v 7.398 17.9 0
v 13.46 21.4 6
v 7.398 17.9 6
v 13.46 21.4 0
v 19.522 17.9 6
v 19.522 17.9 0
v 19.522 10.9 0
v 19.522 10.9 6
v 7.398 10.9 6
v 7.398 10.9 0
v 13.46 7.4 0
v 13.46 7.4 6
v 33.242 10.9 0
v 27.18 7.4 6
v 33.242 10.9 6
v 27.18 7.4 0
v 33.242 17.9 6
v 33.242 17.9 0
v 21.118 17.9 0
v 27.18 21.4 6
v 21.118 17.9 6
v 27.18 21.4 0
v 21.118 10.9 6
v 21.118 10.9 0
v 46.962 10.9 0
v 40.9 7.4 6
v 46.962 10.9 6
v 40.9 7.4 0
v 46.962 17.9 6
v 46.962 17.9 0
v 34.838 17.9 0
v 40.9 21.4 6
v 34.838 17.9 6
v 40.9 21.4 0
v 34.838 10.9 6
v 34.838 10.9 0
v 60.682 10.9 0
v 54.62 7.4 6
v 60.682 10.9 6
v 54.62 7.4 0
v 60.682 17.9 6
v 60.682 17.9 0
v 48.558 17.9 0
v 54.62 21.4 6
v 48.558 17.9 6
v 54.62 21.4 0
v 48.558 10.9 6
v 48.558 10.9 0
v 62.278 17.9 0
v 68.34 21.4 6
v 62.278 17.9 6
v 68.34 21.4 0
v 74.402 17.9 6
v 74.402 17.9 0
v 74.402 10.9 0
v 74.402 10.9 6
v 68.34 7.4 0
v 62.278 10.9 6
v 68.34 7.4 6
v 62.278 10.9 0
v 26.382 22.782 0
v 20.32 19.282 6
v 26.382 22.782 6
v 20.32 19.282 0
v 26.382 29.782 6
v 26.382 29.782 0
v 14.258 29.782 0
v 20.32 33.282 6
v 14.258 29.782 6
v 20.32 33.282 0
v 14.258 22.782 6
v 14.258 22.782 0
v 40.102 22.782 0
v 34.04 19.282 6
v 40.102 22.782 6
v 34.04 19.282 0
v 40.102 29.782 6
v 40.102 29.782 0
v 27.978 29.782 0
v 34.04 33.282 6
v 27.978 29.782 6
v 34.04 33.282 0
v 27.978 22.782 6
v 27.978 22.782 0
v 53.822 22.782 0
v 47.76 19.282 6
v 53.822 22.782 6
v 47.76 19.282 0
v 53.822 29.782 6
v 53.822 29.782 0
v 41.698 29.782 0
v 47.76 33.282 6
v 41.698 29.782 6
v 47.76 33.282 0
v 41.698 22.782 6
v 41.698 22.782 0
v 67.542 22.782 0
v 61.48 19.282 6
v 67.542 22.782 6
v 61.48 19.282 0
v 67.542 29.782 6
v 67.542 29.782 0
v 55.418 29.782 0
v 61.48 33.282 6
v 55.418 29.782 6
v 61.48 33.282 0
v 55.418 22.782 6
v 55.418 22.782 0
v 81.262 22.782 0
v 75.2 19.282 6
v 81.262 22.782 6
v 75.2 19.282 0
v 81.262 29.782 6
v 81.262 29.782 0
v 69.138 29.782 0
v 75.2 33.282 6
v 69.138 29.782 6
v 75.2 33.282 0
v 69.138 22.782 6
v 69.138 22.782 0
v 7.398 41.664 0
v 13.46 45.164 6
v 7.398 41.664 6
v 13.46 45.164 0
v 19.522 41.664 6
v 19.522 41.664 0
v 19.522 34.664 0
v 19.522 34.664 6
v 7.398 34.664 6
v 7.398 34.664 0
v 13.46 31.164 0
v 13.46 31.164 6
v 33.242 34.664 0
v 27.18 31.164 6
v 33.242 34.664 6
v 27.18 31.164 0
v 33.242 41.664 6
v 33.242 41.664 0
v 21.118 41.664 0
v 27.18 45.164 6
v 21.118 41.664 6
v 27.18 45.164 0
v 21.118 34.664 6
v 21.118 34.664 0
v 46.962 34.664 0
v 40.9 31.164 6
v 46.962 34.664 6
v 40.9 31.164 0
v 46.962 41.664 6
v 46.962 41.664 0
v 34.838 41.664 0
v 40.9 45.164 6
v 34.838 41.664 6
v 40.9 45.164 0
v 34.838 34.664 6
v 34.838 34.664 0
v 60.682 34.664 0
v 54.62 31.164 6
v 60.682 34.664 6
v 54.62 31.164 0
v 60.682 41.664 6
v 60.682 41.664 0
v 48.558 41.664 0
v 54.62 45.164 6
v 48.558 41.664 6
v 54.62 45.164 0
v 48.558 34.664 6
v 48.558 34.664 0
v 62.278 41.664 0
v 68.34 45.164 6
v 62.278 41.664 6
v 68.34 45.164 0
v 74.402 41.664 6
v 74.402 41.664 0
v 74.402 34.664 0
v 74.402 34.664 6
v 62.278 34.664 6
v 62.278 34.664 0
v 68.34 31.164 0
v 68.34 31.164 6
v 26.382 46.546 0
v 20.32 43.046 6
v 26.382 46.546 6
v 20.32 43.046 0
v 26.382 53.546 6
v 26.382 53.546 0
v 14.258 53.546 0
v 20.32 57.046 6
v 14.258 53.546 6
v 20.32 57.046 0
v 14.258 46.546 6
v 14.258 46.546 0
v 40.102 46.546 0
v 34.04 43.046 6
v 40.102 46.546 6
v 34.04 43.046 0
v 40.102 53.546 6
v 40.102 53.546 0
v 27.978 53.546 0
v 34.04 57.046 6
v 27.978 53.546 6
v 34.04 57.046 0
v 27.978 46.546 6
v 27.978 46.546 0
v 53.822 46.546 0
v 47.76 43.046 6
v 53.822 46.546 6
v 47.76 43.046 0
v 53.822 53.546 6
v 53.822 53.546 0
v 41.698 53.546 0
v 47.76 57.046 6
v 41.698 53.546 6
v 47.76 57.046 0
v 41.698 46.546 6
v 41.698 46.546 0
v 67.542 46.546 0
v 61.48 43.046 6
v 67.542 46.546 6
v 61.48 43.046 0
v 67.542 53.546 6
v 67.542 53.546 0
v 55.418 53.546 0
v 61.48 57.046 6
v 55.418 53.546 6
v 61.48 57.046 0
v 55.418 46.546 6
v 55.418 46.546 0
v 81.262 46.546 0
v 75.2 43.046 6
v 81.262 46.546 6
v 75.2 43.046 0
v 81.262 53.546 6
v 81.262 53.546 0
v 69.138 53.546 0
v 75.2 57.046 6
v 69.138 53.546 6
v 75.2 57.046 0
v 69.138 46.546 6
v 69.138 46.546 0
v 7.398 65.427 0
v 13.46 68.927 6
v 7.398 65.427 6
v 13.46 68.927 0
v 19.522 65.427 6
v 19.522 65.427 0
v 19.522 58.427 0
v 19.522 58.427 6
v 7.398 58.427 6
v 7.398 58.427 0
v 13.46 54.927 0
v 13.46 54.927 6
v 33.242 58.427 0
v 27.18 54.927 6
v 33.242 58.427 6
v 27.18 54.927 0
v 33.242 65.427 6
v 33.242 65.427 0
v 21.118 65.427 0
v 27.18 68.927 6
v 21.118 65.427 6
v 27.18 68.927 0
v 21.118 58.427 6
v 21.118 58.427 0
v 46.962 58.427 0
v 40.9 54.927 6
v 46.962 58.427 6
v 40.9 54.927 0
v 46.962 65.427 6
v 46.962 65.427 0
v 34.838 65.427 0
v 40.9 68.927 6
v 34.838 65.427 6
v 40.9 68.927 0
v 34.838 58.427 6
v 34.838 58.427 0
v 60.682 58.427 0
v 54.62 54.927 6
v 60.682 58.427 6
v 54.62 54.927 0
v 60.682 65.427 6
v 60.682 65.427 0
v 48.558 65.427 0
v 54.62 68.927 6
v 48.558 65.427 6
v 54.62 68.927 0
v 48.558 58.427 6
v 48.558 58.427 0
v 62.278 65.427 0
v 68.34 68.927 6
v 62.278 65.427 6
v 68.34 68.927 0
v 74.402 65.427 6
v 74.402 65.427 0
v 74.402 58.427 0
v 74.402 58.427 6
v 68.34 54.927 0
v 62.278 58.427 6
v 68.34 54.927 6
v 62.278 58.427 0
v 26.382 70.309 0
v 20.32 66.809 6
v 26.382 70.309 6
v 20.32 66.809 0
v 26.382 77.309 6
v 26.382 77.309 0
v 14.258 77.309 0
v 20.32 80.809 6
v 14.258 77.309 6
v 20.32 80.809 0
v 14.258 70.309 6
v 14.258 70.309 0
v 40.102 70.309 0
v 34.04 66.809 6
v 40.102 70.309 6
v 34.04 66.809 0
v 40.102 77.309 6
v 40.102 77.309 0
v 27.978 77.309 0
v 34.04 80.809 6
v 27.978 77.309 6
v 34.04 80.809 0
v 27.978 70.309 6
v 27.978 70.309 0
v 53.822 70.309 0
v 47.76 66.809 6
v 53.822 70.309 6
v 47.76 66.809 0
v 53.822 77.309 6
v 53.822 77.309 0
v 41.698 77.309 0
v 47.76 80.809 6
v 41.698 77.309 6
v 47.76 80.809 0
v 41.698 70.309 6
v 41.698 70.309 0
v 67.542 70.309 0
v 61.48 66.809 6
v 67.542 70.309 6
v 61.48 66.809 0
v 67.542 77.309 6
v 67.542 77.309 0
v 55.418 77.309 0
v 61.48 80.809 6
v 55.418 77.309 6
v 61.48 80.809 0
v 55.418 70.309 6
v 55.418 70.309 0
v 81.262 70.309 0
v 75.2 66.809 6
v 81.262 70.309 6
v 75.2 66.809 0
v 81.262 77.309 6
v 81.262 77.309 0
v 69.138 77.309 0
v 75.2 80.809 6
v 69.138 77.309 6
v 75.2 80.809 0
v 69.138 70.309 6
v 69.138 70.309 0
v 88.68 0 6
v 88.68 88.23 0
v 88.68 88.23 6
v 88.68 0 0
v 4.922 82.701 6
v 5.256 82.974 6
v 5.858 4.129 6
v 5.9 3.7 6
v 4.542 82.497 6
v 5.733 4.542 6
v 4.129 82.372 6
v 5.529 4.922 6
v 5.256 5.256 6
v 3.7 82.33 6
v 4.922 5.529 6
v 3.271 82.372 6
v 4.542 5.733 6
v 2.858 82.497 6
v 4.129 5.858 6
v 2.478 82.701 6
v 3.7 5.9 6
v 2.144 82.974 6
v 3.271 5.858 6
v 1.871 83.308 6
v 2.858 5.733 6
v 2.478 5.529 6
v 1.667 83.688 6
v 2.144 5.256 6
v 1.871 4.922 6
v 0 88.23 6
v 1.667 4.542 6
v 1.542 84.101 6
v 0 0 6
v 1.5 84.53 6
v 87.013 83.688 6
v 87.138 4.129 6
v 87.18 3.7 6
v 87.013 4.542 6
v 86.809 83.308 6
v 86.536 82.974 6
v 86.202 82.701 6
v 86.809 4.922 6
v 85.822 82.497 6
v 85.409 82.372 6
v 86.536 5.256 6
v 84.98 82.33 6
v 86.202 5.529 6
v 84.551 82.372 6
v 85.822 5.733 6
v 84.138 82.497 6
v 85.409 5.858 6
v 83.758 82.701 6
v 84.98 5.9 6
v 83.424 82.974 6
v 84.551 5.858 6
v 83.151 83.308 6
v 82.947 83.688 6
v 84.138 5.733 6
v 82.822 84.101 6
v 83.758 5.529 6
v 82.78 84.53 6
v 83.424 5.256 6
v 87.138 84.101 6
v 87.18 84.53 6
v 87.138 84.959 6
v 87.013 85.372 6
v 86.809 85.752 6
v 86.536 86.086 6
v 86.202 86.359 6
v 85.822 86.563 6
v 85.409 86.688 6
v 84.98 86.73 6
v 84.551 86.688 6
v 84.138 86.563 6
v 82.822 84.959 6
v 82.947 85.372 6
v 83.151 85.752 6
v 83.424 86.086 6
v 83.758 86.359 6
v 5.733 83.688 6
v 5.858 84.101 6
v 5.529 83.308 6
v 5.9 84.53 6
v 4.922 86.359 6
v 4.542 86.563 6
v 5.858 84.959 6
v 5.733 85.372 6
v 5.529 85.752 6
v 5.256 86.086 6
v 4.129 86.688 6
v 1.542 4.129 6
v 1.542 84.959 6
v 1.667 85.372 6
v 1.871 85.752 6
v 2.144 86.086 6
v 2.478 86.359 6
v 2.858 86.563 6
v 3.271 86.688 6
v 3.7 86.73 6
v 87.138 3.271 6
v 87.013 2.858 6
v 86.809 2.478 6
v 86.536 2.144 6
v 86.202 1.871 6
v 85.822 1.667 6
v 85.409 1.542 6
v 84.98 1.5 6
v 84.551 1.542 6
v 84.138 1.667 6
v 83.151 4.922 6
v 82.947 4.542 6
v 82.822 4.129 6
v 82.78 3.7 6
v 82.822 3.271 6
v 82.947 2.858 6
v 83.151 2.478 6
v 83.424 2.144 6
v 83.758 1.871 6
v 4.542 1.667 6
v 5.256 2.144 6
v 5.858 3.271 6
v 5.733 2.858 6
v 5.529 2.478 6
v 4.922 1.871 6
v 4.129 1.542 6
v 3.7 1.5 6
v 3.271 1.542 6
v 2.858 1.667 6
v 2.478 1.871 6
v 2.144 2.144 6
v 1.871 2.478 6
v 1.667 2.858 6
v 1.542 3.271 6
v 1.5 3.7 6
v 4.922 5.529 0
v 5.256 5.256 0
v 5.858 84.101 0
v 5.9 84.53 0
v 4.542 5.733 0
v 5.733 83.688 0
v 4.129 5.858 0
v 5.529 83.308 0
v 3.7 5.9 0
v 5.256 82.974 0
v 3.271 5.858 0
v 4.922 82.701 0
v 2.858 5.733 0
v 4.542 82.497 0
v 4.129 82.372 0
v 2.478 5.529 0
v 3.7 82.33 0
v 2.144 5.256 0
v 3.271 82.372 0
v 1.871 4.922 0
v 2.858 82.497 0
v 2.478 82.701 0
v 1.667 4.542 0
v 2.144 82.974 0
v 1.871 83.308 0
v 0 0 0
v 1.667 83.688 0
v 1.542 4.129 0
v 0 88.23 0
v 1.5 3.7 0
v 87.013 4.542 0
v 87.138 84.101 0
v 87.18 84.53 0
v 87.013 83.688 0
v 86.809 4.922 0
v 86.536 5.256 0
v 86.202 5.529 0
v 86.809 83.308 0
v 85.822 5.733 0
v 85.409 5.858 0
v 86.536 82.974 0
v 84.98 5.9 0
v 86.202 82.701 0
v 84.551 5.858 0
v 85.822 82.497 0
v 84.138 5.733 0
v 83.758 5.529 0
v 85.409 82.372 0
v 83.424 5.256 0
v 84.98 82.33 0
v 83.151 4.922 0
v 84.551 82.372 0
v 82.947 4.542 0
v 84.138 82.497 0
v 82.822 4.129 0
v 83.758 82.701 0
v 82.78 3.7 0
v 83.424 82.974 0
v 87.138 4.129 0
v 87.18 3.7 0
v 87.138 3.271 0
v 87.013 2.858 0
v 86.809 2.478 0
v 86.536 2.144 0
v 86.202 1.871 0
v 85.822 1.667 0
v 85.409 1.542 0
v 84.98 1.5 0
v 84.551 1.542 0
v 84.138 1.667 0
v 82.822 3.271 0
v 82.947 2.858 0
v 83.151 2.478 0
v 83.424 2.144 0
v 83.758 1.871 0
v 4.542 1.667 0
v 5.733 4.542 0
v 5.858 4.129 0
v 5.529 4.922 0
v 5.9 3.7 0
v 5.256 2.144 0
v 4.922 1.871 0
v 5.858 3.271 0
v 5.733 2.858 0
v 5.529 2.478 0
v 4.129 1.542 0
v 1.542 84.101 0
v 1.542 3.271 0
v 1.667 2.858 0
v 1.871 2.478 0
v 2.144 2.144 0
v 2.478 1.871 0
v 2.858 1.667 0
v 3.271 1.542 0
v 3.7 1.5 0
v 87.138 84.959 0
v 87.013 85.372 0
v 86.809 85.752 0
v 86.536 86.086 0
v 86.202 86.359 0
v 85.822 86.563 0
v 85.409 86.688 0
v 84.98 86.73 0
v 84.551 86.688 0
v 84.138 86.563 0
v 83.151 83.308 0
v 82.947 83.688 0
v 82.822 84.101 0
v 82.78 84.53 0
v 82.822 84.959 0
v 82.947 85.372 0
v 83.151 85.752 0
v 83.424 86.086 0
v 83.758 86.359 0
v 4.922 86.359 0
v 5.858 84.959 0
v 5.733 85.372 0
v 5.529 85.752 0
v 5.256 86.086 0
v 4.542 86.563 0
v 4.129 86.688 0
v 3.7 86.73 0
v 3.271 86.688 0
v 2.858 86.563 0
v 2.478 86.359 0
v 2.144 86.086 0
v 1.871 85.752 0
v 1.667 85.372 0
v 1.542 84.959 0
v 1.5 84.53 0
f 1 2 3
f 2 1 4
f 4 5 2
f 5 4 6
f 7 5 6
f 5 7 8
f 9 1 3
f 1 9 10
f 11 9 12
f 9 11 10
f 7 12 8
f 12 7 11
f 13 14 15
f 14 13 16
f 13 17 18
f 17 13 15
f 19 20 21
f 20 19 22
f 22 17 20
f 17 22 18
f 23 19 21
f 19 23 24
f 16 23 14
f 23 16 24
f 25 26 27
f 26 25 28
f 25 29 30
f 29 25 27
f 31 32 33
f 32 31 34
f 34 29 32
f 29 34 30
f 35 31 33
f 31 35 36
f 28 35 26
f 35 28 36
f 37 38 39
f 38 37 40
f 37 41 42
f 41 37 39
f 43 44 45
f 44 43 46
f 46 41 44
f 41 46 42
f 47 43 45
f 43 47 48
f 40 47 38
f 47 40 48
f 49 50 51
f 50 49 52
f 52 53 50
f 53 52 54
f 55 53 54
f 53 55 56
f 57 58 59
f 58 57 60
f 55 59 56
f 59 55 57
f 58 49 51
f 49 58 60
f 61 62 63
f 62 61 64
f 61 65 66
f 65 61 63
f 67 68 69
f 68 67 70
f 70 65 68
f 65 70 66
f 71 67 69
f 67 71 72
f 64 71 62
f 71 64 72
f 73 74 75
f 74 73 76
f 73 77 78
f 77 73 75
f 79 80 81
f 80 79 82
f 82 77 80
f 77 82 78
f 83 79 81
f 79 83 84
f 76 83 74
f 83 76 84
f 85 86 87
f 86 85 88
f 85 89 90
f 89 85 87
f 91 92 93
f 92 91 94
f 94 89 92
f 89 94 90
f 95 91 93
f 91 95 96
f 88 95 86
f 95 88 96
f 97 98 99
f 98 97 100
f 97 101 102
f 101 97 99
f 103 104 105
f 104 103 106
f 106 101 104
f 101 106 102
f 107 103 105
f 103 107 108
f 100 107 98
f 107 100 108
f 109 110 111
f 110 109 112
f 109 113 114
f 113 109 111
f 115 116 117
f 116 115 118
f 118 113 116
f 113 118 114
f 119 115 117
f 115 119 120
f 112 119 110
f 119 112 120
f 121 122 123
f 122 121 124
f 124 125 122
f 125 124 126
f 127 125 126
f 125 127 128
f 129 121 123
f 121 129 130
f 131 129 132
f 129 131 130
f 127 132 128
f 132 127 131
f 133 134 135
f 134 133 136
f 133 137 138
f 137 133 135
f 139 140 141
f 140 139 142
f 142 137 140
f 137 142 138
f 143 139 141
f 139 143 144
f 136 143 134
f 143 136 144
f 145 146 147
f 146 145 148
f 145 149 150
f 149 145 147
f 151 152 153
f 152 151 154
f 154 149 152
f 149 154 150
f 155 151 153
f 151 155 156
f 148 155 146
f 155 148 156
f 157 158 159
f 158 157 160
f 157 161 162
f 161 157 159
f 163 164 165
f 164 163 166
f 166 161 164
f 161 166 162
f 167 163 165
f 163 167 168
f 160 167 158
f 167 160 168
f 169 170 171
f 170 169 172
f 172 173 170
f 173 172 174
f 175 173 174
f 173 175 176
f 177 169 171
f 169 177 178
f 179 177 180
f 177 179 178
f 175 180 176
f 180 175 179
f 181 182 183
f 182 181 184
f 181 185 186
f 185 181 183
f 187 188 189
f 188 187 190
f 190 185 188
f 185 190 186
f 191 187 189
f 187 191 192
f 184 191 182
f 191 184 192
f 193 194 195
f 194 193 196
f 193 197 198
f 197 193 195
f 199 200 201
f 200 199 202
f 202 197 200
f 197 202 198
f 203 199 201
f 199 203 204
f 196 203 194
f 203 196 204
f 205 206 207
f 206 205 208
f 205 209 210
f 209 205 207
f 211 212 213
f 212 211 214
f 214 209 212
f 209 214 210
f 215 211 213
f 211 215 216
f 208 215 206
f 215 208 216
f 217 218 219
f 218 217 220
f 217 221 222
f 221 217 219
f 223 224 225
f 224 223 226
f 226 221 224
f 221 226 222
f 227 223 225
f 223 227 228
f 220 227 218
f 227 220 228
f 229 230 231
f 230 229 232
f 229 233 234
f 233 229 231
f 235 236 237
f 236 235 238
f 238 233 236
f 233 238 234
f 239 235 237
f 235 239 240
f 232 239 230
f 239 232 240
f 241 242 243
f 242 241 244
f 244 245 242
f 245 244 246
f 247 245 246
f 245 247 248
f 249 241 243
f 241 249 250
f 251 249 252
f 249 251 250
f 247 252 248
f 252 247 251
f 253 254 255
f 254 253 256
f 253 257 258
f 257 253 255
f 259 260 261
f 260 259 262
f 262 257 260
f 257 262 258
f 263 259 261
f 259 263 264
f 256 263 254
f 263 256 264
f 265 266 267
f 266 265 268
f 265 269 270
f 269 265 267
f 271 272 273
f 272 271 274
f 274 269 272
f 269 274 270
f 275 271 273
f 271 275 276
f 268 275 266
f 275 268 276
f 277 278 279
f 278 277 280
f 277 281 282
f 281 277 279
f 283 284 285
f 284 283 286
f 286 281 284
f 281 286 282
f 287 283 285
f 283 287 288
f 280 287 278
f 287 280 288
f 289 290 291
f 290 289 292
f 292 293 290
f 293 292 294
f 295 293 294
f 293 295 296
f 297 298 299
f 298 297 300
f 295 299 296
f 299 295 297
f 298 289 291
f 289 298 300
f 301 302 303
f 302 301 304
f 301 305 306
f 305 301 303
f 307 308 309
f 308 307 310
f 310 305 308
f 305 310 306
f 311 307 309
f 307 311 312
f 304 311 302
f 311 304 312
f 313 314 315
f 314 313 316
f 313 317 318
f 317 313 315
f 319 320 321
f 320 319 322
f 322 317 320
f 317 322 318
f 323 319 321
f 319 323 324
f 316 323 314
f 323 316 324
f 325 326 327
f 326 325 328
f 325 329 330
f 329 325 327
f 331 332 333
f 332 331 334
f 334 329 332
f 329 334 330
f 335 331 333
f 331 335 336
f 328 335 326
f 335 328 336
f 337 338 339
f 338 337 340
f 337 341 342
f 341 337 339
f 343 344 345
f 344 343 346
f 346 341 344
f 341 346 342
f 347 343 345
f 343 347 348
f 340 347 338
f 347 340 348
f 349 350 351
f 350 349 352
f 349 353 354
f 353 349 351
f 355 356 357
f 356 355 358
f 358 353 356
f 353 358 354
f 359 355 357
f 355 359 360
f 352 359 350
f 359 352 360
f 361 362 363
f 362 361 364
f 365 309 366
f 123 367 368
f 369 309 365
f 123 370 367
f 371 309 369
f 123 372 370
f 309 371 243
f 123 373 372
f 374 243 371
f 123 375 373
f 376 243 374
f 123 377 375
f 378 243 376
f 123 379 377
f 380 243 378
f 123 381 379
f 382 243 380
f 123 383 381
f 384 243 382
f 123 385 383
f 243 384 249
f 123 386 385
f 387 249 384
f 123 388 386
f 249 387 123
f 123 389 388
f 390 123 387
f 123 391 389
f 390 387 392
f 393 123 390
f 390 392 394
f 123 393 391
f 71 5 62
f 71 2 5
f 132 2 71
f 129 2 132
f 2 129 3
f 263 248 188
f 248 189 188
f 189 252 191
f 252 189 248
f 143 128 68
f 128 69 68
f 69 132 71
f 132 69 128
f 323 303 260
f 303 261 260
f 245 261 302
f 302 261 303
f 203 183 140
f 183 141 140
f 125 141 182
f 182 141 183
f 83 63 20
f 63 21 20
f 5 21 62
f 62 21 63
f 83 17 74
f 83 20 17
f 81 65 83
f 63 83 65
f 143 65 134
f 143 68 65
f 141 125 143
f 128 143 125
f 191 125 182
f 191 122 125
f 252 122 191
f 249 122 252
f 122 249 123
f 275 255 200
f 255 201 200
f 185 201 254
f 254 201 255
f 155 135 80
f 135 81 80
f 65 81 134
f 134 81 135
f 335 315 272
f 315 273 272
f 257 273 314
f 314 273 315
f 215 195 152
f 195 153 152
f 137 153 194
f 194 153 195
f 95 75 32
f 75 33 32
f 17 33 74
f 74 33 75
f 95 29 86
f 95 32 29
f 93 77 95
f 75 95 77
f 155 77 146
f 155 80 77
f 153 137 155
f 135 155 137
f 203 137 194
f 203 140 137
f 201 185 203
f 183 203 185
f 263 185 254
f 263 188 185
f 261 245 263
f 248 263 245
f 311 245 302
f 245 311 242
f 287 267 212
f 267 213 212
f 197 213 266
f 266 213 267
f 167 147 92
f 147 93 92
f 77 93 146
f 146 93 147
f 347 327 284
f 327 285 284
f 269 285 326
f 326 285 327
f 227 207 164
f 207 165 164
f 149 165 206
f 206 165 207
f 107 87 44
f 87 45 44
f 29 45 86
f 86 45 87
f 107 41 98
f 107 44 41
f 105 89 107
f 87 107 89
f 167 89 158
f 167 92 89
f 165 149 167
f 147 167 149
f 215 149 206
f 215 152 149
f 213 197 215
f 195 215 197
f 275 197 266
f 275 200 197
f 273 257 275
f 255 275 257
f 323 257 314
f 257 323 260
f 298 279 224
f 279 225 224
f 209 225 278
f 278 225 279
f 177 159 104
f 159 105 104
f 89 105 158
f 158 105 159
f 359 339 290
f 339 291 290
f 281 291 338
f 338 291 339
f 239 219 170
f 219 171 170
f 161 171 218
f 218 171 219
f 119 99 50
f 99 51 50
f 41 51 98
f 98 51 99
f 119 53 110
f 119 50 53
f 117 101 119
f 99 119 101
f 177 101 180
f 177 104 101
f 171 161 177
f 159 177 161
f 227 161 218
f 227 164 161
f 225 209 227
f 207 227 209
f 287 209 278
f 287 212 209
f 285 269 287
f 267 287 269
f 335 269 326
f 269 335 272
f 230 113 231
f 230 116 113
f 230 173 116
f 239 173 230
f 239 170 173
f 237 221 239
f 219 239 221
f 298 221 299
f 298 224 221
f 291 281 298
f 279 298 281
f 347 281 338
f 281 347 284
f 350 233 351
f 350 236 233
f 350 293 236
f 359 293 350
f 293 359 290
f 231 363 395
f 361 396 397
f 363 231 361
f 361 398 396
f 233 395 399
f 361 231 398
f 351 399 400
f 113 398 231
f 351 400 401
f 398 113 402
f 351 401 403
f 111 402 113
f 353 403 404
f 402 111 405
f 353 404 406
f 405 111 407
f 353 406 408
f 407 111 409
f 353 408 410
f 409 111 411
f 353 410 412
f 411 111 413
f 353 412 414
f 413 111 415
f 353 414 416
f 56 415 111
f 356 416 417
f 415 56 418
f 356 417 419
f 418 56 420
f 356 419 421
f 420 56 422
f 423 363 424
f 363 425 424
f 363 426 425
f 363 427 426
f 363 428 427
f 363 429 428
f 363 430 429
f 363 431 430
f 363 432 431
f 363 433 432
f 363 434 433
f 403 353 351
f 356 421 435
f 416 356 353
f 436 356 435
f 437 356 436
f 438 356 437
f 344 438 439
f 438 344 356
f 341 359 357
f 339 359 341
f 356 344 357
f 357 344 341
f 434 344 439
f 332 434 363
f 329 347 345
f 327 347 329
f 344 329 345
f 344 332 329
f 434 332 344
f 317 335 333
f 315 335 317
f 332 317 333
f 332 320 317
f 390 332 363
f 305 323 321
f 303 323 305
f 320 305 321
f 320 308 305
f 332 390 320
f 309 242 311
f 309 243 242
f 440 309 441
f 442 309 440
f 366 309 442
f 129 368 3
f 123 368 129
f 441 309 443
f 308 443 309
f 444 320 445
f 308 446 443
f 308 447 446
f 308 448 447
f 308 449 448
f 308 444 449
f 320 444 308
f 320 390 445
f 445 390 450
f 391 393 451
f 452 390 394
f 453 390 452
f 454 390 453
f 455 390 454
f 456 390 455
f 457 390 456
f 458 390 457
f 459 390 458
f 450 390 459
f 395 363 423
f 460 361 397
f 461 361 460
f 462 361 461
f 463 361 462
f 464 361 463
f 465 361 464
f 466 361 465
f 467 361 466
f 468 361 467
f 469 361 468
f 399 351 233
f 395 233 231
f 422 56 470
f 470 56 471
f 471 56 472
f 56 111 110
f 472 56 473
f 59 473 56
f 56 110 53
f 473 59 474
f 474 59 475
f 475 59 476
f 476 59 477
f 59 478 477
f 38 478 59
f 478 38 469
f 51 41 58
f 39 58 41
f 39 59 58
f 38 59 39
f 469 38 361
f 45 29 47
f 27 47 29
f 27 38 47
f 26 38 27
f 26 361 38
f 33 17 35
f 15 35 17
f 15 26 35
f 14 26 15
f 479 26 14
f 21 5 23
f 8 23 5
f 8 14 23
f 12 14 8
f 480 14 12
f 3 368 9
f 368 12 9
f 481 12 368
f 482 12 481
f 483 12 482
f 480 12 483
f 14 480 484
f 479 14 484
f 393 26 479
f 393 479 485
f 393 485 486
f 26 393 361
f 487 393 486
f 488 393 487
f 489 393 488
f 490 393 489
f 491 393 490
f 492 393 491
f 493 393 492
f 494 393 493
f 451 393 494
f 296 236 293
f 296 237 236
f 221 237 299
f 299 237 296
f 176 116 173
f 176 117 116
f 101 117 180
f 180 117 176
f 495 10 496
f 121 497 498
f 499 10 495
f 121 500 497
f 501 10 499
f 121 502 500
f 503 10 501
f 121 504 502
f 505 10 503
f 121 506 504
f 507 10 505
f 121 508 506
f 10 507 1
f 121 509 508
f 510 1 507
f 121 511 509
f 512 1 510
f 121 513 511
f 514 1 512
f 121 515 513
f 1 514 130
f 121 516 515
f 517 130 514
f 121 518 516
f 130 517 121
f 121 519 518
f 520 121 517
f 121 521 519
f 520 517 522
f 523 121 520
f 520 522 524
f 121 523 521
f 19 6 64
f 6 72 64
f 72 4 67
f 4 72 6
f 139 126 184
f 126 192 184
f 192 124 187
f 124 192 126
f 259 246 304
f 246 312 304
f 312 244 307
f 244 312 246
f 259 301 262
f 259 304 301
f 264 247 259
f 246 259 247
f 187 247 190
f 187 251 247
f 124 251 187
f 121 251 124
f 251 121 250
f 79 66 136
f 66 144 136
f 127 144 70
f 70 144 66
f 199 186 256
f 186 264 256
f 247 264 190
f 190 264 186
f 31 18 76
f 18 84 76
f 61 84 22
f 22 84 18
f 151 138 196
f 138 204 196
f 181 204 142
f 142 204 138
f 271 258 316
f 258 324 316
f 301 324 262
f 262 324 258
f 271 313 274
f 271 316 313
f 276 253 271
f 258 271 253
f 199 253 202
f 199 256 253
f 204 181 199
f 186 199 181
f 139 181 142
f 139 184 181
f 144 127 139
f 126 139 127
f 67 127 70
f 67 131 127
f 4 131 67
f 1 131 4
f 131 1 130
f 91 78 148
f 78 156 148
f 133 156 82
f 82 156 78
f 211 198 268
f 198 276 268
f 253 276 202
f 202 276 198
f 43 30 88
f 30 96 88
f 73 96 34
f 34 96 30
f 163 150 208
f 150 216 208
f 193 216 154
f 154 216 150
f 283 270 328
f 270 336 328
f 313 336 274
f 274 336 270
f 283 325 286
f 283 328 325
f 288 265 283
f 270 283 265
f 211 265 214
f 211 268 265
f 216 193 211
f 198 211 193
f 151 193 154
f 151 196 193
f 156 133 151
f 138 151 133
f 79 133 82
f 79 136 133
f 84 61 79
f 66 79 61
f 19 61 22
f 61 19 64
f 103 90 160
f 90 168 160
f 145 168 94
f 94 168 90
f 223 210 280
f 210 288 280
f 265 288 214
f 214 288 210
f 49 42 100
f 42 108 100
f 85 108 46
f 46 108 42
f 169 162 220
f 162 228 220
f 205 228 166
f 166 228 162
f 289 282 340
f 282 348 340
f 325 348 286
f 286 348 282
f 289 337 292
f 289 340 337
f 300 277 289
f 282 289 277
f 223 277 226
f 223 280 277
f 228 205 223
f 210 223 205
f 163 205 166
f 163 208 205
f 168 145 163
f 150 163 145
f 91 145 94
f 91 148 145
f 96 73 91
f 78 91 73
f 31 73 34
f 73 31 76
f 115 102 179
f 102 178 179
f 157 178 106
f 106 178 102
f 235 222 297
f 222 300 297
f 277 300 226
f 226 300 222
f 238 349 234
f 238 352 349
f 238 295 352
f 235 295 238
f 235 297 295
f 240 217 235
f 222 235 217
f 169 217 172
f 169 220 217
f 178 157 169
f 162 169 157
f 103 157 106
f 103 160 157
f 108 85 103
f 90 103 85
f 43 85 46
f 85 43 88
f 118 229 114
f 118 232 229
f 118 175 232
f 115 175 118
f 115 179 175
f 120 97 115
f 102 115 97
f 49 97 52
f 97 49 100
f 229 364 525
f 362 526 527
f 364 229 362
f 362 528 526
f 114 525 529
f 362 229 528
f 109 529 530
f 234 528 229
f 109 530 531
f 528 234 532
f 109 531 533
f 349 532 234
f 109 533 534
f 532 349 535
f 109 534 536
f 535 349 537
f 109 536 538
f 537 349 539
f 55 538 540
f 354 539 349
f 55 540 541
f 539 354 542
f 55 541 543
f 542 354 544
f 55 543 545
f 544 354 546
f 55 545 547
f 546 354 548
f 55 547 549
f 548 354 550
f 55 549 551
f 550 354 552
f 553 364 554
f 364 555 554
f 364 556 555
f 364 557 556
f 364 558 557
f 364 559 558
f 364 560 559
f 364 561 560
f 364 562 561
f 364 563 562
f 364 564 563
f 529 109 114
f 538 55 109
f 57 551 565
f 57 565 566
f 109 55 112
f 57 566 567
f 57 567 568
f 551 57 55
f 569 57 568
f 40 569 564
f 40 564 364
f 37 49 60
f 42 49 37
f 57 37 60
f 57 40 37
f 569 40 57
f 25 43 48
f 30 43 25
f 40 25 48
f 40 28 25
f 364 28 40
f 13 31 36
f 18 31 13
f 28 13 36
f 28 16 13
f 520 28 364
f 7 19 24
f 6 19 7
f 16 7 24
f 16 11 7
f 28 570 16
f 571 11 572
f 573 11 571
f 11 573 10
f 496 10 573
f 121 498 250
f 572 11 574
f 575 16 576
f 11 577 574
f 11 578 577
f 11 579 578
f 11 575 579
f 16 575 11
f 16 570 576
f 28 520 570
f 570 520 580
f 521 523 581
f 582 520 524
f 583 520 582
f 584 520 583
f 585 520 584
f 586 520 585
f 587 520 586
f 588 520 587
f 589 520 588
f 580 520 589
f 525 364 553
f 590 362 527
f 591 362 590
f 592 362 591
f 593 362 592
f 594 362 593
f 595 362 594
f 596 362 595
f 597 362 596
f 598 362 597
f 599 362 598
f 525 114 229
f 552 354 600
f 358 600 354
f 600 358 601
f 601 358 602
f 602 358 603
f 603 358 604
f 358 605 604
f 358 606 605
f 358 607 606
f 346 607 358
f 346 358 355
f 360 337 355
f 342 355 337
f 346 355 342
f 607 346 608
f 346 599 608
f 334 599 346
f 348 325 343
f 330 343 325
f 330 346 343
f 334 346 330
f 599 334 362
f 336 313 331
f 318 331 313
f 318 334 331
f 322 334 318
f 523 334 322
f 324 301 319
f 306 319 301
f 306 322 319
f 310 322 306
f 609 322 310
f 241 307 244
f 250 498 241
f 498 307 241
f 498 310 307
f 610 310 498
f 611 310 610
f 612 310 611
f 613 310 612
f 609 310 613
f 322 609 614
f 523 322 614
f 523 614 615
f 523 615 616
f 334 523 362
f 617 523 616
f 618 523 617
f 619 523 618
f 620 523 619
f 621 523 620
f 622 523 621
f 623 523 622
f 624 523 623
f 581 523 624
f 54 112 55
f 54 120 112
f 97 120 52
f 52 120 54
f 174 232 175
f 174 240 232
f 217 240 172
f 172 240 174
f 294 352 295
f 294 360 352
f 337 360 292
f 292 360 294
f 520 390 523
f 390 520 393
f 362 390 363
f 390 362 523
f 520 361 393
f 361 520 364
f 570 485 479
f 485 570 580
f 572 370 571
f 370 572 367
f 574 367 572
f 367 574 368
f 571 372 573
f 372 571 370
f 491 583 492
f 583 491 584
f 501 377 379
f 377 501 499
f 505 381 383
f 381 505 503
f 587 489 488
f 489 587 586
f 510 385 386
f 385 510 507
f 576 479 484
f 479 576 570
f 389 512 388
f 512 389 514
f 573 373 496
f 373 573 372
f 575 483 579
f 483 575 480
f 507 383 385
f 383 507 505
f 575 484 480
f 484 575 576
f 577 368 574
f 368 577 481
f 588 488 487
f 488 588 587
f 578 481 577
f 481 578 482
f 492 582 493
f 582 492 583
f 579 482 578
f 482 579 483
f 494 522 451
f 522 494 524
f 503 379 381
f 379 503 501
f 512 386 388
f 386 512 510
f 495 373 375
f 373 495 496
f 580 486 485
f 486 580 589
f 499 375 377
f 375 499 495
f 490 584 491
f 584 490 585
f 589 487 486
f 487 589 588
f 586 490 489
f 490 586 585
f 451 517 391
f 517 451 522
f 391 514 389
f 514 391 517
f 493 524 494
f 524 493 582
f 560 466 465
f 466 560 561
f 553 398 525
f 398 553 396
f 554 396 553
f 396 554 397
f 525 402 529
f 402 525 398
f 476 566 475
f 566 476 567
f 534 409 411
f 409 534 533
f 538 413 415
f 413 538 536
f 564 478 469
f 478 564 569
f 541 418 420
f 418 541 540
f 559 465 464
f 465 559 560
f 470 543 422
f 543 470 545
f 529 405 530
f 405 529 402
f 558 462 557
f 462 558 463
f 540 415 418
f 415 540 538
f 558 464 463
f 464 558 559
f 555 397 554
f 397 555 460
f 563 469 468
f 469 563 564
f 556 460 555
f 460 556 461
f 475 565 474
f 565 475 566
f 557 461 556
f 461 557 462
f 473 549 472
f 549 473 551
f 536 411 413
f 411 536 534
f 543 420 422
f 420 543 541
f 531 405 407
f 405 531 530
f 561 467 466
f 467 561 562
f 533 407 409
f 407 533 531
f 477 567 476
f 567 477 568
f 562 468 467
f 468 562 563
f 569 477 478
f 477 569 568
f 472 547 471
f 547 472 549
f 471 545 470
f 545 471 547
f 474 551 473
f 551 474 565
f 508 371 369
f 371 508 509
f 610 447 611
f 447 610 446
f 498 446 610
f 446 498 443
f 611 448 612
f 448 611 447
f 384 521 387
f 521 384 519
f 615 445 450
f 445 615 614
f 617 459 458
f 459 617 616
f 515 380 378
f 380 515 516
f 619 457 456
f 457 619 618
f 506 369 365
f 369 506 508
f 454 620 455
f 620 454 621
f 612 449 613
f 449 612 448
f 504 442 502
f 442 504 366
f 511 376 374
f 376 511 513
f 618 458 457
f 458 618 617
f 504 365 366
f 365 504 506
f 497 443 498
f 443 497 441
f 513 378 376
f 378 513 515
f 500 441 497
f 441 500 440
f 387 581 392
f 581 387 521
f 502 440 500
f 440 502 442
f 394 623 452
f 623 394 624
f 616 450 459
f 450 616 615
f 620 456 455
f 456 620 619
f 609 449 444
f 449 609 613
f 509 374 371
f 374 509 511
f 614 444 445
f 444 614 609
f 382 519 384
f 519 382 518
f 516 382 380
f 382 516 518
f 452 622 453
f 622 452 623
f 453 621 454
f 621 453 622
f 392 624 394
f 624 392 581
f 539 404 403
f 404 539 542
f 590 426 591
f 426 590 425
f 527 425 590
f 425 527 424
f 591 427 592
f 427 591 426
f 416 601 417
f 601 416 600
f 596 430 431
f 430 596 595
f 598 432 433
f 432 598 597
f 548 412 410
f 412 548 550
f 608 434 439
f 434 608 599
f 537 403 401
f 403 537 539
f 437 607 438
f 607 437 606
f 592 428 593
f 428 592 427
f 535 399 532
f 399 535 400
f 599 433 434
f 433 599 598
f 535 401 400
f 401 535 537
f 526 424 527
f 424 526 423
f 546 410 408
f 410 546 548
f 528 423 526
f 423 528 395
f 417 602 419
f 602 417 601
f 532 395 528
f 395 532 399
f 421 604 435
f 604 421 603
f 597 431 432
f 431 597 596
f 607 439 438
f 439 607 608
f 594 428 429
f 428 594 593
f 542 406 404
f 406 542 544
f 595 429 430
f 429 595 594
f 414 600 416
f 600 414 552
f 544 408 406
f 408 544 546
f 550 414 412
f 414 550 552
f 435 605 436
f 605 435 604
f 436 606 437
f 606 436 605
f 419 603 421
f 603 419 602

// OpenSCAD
$fn = 32;

// ----------------------------------------------------------------------
// Honeycomb panel: 88.68 x 88.23 mm, 30 cells of 14 mm
// ----------------------------------------------------------------------

// --- parameters (mm) ---
panel_w = 88.68;          // panel width
panel_d = 88.23;          // panel depth
thick = 6;                // panel thickness
cell_r = 7;               // hex cell circumradius
pitch = 13.72;            // hex cell pitch (centre to centre)
web = 1.6;                // web between the cells
columns = 5;              // columns of cells
rows = 6;                 // rows of cells
cell_count = 30;          // total cells
shift_x = 13.46;          // first cell offset in x
shift_y = 14.4;           // first cell offset in y
mount_d = 4.4;            // corner mounting holes
hole_off = 3.7;           // mounting hole offset from the corners

difference() {
  union() {
    cube([panel_w, panel_d, thick]);
  }
  /* hexagonal cells, point-up, cut right through the plate */
  for (row = [0 : rows - 1]) {
    for (col = [0 : columns - 1]) {
      translate([shift_x + col * pitch + (row % 2) * pitch / 2, shift_y + row * pitch * 0.866025, -2.5]) rotate([0, 0, 30]) cylinder(h = thick + 5, d = 2 * cell_r, $fn = 6);
    }
  }
  /* corner mounting holes, clear of the outer cell web */
  translate([3.7, 3.7, -2.5]) cylinder(h = thick + 5, d = mount_d);
  translate([84.98, 3.7, -2.5]) cylinder(h = thick + 5, d = mount_d);
  translate([3.7, 84.53, -2.5]) cylinder(h = thick + 5, d = mount_d);
  translate([84.98, 84.53, -2.5]) cylinder(h = thick + 5, d = mount_d);
}
